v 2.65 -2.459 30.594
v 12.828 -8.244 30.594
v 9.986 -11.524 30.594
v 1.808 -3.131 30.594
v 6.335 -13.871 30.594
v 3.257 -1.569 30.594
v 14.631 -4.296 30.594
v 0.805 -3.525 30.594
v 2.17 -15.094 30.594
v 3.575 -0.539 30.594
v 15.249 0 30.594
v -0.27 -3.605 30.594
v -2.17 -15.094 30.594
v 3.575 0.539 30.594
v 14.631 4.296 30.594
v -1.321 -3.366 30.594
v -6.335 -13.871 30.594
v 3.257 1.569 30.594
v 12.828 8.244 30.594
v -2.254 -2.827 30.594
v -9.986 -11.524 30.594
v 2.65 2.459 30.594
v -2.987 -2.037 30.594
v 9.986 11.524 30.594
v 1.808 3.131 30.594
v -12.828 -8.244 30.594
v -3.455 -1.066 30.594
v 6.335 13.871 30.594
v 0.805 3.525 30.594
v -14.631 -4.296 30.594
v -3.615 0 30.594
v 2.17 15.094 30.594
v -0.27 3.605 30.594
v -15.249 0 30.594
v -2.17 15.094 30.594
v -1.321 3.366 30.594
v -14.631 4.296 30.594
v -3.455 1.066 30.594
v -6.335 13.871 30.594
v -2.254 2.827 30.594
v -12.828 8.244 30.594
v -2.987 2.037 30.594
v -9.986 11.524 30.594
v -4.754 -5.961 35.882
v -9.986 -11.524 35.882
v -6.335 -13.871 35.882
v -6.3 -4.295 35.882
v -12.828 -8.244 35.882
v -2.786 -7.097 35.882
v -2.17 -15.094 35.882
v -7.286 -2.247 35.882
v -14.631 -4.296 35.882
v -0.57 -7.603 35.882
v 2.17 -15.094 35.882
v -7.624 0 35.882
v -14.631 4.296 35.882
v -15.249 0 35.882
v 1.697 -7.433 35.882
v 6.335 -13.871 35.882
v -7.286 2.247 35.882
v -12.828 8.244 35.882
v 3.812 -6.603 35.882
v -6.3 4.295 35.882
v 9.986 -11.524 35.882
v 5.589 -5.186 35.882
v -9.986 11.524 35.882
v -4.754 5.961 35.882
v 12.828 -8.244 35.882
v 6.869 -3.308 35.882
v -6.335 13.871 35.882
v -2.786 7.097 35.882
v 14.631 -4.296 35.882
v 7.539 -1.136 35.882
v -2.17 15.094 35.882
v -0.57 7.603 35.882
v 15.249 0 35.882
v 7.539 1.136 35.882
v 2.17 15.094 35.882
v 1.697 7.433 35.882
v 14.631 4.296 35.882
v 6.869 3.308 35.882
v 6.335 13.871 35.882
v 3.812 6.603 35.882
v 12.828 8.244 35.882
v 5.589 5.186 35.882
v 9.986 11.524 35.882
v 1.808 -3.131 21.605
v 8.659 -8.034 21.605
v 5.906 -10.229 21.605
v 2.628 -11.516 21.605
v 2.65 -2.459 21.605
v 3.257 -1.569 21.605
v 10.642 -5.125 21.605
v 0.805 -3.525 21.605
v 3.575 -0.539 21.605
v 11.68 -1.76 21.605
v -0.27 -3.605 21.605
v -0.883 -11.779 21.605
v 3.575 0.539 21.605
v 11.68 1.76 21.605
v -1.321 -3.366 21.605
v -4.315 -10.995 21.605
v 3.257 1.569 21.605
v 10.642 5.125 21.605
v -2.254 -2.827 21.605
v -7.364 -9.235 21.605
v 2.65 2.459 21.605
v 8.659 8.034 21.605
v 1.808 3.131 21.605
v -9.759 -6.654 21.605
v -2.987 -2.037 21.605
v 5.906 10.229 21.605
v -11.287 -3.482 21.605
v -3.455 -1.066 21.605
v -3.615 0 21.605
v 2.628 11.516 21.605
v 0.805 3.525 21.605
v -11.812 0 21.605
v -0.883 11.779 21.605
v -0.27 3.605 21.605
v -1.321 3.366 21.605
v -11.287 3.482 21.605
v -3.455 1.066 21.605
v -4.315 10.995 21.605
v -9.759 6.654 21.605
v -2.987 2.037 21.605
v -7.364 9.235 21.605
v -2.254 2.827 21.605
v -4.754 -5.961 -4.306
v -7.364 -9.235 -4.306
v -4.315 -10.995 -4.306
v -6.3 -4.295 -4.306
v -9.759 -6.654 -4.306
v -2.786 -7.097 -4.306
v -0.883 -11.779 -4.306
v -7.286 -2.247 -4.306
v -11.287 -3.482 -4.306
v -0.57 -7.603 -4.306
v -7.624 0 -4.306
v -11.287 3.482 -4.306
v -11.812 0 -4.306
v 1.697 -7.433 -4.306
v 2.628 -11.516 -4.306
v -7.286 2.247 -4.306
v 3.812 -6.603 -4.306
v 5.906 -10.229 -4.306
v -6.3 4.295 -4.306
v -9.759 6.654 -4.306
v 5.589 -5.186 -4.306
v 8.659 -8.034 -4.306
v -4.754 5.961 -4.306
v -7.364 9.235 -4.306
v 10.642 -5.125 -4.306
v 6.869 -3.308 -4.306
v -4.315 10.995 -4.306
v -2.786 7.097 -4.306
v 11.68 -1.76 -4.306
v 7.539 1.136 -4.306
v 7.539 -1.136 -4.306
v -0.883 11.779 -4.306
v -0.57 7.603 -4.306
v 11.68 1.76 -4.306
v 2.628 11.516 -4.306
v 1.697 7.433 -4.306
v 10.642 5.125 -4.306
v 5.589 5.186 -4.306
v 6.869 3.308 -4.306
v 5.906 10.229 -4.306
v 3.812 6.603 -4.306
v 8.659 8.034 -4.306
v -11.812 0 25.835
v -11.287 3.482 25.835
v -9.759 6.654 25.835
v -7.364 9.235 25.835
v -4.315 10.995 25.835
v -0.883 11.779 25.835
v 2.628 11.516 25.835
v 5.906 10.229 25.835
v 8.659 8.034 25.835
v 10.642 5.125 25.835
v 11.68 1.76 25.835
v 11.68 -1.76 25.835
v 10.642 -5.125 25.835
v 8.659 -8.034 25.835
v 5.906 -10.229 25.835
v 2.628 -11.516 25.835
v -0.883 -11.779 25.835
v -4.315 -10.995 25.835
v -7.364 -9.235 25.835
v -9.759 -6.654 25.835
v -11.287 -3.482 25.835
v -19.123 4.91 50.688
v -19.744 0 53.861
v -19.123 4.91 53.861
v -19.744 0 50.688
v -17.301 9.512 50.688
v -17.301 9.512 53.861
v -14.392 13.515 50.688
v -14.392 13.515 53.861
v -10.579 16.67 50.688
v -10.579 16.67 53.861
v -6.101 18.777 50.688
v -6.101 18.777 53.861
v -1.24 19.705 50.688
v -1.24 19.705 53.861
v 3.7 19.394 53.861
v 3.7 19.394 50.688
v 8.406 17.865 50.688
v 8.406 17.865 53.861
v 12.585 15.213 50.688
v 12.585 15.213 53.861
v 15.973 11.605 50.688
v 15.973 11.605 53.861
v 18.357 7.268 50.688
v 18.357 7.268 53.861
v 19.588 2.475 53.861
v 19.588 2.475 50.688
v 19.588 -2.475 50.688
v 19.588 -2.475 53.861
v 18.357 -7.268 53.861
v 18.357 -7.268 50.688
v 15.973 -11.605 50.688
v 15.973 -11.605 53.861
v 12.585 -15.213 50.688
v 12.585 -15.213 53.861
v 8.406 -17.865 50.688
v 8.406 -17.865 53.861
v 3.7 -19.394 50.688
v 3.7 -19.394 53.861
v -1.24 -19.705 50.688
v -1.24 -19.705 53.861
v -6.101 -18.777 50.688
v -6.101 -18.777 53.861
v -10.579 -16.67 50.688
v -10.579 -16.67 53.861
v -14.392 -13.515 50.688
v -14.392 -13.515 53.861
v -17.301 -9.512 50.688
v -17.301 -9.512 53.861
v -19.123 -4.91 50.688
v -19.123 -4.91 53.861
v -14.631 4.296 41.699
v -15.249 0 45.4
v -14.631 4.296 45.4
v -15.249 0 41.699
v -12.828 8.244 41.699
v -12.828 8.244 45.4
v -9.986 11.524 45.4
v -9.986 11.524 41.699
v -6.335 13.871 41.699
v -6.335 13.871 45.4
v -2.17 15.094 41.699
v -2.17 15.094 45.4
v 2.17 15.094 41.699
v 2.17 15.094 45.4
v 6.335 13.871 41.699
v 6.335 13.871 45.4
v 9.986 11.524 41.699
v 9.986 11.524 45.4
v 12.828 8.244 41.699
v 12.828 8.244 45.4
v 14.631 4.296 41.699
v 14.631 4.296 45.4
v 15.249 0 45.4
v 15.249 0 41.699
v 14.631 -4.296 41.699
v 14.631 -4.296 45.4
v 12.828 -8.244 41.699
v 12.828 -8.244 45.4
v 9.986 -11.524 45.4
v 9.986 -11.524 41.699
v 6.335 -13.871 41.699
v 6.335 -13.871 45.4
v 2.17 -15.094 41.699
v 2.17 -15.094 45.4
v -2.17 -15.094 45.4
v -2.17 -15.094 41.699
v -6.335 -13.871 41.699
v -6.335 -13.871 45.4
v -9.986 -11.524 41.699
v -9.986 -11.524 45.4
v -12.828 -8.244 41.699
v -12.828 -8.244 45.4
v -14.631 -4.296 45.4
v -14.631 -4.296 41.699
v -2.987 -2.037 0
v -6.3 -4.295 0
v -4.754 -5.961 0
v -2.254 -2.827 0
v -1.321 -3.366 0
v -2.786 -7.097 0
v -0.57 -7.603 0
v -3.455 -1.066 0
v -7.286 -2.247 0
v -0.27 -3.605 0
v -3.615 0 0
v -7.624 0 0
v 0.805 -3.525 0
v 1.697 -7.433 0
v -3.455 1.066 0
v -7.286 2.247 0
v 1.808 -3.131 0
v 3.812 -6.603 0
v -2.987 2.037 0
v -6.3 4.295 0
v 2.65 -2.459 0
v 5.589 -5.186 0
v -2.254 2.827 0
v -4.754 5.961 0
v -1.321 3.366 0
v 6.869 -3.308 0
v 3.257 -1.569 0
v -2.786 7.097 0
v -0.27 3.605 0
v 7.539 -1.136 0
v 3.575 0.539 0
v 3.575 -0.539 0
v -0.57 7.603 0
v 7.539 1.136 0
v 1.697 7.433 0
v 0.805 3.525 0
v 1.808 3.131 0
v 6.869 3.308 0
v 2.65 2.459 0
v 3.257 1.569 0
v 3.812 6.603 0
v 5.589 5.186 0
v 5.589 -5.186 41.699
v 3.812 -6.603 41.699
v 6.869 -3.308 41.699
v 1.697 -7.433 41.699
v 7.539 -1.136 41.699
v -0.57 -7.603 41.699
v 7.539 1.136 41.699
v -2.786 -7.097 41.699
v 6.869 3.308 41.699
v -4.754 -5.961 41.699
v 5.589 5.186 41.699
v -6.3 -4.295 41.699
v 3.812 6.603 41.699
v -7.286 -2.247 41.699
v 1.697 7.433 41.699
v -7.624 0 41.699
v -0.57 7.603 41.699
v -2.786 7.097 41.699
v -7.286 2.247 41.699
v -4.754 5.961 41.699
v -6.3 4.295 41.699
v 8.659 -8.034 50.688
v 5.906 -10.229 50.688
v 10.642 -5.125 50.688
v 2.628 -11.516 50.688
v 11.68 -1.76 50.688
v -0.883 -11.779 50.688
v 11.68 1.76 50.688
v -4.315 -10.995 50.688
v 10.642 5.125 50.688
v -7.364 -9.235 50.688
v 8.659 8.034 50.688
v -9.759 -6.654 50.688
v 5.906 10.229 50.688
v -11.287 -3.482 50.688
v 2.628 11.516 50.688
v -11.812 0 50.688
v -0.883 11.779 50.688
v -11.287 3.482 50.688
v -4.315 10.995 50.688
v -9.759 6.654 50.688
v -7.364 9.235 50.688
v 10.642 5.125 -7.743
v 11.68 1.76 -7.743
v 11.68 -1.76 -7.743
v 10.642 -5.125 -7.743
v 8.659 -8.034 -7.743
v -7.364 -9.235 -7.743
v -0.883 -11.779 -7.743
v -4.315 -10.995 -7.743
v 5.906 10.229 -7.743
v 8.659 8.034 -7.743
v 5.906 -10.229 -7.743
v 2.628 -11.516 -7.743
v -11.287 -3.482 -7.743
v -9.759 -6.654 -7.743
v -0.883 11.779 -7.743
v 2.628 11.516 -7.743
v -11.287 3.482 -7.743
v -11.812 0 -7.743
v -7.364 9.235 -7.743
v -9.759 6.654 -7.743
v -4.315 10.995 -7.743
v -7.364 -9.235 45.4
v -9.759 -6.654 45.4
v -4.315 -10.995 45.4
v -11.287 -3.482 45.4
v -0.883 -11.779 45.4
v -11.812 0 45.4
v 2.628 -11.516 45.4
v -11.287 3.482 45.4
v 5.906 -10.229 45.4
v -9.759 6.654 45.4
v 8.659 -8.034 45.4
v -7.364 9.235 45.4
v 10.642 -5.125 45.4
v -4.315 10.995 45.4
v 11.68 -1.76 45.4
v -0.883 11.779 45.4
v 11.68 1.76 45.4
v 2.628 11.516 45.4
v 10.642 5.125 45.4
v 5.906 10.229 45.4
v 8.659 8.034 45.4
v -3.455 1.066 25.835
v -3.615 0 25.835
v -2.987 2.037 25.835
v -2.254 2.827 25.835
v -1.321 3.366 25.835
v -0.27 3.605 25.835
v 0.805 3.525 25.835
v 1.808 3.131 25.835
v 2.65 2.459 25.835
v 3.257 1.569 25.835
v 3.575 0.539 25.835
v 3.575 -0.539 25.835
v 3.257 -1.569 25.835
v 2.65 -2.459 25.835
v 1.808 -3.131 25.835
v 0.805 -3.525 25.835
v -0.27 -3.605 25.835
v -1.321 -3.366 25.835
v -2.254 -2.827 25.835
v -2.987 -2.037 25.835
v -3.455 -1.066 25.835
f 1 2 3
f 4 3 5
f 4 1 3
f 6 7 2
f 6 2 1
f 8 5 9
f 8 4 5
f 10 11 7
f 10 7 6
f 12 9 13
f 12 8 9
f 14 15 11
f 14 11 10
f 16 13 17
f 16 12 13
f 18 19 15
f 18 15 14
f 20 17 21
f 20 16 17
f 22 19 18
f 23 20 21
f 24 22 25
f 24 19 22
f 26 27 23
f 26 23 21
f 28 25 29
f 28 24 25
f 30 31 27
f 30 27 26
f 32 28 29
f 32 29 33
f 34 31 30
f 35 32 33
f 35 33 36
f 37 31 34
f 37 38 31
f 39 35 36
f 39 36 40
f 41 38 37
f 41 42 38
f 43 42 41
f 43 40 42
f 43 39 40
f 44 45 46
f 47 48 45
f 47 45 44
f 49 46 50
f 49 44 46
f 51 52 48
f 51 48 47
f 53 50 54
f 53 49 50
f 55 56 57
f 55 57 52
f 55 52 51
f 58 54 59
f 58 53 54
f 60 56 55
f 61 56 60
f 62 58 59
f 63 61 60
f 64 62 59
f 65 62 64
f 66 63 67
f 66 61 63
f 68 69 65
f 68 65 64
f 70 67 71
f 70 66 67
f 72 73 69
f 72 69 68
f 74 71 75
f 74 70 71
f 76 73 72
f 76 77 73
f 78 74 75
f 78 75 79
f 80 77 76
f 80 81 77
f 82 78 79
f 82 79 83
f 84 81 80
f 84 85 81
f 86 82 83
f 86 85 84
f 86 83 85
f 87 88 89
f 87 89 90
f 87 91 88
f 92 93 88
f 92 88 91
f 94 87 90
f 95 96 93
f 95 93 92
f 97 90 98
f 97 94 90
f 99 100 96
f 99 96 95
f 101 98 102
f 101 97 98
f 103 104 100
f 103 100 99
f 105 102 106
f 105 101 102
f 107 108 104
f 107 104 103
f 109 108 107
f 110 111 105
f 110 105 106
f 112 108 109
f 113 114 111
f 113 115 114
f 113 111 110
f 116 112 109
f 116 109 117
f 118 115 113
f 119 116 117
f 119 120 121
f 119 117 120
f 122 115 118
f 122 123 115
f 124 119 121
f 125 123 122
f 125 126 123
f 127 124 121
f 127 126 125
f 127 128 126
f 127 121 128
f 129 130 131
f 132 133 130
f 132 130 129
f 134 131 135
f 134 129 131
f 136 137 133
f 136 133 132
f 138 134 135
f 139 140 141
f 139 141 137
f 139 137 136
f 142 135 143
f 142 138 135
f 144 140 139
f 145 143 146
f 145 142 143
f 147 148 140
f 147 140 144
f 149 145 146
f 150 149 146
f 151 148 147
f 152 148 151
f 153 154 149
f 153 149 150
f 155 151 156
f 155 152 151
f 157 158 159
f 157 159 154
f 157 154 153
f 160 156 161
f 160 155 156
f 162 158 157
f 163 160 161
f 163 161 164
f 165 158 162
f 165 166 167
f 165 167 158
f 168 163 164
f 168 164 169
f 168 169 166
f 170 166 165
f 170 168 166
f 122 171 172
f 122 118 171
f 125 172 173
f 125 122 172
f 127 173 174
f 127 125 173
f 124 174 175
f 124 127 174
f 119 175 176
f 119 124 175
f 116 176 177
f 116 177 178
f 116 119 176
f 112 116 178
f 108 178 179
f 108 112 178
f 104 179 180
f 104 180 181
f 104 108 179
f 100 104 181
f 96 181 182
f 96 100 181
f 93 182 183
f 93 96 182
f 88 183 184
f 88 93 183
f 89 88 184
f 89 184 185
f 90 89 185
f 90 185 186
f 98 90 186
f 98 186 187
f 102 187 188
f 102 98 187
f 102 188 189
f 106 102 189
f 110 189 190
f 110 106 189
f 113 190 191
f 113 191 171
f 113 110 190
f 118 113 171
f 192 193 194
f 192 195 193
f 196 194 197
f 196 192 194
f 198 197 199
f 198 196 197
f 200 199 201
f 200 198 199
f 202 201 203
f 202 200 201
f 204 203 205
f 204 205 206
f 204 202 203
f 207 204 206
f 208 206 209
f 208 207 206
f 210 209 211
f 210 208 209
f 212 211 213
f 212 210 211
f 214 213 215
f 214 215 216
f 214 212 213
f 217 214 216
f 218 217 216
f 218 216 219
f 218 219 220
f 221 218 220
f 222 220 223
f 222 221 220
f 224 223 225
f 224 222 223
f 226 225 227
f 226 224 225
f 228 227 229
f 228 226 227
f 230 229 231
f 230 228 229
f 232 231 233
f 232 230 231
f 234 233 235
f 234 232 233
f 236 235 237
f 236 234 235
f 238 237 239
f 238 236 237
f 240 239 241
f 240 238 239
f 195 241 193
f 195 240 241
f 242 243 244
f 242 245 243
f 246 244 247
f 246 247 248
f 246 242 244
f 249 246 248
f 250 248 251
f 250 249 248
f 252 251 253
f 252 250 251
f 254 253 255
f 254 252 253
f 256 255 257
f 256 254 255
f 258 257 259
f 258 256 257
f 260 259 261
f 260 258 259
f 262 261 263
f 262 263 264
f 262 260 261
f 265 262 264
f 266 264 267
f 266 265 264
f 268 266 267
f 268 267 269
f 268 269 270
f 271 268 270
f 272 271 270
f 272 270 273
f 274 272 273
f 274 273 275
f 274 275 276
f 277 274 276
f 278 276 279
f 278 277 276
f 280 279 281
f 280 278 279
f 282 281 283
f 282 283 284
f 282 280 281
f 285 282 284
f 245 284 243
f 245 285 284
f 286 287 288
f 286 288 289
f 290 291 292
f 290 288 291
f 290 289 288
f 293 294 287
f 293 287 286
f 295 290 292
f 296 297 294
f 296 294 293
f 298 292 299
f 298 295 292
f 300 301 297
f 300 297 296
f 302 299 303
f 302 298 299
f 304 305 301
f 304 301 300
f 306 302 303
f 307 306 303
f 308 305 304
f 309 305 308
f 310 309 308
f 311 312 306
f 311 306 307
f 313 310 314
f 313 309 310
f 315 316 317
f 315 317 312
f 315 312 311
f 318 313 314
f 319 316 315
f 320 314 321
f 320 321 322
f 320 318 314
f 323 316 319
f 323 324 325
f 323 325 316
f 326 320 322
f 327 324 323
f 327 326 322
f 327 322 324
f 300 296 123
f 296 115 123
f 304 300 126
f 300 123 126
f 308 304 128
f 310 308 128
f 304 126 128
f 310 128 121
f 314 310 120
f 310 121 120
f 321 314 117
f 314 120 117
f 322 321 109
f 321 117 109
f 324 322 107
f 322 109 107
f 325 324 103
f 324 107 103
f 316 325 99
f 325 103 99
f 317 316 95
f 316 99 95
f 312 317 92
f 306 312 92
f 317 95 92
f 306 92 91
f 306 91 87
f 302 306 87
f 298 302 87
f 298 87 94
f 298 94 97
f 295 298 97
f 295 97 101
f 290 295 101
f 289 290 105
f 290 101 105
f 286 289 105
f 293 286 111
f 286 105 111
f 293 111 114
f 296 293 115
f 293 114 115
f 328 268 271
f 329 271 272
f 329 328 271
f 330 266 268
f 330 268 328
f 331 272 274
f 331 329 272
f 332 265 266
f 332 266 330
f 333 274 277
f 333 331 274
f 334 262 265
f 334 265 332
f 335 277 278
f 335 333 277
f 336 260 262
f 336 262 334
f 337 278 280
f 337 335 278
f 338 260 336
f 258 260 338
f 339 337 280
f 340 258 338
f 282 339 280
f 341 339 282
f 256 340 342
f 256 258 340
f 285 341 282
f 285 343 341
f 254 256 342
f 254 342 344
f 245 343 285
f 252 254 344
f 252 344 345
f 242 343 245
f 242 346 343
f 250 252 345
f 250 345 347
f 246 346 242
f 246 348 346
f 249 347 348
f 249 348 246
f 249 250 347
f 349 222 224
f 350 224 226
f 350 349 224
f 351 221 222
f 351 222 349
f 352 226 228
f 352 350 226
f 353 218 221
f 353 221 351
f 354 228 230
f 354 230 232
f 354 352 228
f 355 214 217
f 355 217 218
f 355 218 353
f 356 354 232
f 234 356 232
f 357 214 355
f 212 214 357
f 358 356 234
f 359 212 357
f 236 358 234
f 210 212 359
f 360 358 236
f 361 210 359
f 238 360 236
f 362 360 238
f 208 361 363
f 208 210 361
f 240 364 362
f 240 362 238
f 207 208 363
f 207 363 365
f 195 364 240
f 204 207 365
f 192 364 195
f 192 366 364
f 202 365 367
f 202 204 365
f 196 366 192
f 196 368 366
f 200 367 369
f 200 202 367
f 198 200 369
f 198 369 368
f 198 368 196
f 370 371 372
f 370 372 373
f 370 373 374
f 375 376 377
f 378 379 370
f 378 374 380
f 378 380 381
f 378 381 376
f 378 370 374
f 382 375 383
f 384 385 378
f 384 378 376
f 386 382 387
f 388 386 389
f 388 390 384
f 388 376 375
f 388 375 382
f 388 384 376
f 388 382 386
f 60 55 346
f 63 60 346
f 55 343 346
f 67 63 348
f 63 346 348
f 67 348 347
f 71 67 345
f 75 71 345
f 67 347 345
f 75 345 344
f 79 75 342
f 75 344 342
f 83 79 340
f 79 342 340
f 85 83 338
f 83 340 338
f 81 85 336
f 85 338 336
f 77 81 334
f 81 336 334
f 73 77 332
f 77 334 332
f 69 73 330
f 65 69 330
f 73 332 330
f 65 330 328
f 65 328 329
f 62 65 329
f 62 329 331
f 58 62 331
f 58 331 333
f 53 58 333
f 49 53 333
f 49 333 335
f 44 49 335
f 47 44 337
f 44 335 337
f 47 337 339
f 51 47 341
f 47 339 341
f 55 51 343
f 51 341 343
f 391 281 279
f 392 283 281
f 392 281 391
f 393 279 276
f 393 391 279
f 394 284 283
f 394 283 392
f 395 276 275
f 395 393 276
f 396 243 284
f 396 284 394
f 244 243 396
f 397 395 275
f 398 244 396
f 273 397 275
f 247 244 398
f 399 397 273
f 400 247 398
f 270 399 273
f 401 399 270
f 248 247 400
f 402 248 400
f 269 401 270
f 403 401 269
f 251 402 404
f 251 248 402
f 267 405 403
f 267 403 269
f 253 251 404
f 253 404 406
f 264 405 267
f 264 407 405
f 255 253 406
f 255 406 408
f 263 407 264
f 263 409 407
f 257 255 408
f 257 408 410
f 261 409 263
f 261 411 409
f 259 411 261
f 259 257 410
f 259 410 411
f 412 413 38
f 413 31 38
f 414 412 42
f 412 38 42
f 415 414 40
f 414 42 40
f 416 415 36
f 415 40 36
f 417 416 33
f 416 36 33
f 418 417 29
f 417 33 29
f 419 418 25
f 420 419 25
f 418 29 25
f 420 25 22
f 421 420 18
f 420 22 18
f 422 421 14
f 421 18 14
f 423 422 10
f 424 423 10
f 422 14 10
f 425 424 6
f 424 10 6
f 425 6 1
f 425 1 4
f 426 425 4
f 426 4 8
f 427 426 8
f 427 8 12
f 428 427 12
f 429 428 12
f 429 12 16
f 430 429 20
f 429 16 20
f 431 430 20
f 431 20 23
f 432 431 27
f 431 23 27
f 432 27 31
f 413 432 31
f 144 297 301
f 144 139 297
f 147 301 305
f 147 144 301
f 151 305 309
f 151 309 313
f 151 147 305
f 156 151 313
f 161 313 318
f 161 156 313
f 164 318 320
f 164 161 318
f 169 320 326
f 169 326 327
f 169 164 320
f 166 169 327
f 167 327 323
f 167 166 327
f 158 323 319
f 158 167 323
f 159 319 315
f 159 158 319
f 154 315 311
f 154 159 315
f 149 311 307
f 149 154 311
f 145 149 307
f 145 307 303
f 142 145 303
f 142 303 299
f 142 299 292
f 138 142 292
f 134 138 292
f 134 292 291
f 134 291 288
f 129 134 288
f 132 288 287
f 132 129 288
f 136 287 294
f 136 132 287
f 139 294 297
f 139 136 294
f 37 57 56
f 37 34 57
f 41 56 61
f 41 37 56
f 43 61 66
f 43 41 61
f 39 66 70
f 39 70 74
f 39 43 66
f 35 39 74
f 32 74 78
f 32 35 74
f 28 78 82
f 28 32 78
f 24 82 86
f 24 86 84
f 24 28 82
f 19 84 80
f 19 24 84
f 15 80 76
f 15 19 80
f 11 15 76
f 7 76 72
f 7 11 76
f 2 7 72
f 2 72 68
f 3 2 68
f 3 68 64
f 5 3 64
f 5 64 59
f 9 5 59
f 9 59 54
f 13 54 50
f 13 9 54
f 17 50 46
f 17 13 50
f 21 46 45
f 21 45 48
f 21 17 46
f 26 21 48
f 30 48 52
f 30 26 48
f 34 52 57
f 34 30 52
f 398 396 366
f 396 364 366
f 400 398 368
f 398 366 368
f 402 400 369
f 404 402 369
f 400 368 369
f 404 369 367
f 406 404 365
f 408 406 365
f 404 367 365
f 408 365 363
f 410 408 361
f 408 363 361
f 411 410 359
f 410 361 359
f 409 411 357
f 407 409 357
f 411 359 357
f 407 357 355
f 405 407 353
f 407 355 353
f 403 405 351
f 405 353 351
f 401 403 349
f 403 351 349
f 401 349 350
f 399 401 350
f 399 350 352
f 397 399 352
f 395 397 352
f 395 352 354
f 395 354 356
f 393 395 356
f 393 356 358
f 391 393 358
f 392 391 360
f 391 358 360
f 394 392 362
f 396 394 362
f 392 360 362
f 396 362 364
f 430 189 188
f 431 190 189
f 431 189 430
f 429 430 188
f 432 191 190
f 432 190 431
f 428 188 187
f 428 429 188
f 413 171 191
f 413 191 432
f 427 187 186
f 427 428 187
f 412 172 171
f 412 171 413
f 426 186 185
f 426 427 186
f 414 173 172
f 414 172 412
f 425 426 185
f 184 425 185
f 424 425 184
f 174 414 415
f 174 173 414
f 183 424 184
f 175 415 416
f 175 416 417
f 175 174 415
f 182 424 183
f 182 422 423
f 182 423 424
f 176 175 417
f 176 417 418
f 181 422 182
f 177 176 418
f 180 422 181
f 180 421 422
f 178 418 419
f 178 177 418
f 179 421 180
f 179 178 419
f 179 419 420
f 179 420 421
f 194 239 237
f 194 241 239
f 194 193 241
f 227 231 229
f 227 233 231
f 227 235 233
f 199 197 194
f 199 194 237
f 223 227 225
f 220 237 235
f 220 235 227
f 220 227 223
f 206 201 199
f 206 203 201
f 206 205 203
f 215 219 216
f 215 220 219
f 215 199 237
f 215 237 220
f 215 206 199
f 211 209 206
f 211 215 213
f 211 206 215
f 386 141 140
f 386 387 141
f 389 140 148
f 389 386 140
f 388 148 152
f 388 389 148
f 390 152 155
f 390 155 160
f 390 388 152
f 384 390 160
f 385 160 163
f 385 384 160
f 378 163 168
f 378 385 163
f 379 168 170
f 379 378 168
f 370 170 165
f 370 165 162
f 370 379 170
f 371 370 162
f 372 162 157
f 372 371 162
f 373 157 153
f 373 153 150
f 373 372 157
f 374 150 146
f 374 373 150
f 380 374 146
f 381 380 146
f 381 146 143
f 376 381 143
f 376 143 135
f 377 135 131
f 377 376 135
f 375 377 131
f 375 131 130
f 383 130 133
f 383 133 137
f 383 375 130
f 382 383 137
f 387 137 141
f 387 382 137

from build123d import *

# Parameters (mm, degrees)
F0_W   = 11.8117174134
F0_H   = 5.2878893912
F0_W_2 = 7.6244240627
F0_H_2 = 5.8166831732
F0_W_3 = 3.6154794507
F0_H_3 = 4.7591030598
F0_H_4 = 21.6046236455


with BuildPart() as f1:
    # F0 (on Front) → F1 (revolve)
    with BuildSketch(Plane.XZ):
        Polygon((0, 50.6880395114), (0, 53.8607798517), (-19.743559882, 53.8607798517), (-19.743559882, 50.6880395114), (-11.8117174134, 50.6880395114), align=None)
        with Locations((-5.9058587067, 48.0440948159)):
            Rectangle(F0_W, F0_H)
        Polygon((0, 41.6986197233), (0, 45.4001501203), (-11.8117174134, 45.4001501203), (-15.2488481253, 45.4001501203), (-15.2488481253, 41.6986197233), (-7.6244240627, 41.6986197233), align=None)
        with Locations((-3.8122120313, 38.7902781367)):
            Rectangle(F0_W_2, F0_H_2)
        Polygon((0, 30.594041571), (0, 35.8819365501), (-7.6244240627, 35.8819365501), (-15.2488481253, 35.8819365501), (-15.2488481253, 30.594041571), (-3.6154794507, 30.594041571), align=None)
        with Locations((-1.8077397253, 28.2144900411)):
            Rectangle(F0_W_3, F0_H_3)
        Polygon((0, 21.6046236455), (0, 25.8349385113), (-3.6154794507, 25.8349385113), (-11.8117174134, 25.8349385113), (-11.8117174134, 21.6046236455), (-3.6154794507, 21.6046236455), align=None)
        with Locations((-1.8077397253, 10.8023118228)):
            Rectangle(F0_W_3, F0_H_4)
        Polygon((0, -4.3060597964), (0, 0), (-3.6154794507, 0), (-7.6244240627, 0), (-7.6244240627, -4.3060597964), align=None)
        Polygon((0, -7.7431914397), (0, -4.3060597964), (-7.6244240627, -4.3060597964), (-11.8117174134, -4.3060597964), (-11.8117174134, -7.7431914397), align=None)
    revolve(axis=Axis((0, 0, 10.8023118228), (0, 0, -1)))


solid = f1.part
